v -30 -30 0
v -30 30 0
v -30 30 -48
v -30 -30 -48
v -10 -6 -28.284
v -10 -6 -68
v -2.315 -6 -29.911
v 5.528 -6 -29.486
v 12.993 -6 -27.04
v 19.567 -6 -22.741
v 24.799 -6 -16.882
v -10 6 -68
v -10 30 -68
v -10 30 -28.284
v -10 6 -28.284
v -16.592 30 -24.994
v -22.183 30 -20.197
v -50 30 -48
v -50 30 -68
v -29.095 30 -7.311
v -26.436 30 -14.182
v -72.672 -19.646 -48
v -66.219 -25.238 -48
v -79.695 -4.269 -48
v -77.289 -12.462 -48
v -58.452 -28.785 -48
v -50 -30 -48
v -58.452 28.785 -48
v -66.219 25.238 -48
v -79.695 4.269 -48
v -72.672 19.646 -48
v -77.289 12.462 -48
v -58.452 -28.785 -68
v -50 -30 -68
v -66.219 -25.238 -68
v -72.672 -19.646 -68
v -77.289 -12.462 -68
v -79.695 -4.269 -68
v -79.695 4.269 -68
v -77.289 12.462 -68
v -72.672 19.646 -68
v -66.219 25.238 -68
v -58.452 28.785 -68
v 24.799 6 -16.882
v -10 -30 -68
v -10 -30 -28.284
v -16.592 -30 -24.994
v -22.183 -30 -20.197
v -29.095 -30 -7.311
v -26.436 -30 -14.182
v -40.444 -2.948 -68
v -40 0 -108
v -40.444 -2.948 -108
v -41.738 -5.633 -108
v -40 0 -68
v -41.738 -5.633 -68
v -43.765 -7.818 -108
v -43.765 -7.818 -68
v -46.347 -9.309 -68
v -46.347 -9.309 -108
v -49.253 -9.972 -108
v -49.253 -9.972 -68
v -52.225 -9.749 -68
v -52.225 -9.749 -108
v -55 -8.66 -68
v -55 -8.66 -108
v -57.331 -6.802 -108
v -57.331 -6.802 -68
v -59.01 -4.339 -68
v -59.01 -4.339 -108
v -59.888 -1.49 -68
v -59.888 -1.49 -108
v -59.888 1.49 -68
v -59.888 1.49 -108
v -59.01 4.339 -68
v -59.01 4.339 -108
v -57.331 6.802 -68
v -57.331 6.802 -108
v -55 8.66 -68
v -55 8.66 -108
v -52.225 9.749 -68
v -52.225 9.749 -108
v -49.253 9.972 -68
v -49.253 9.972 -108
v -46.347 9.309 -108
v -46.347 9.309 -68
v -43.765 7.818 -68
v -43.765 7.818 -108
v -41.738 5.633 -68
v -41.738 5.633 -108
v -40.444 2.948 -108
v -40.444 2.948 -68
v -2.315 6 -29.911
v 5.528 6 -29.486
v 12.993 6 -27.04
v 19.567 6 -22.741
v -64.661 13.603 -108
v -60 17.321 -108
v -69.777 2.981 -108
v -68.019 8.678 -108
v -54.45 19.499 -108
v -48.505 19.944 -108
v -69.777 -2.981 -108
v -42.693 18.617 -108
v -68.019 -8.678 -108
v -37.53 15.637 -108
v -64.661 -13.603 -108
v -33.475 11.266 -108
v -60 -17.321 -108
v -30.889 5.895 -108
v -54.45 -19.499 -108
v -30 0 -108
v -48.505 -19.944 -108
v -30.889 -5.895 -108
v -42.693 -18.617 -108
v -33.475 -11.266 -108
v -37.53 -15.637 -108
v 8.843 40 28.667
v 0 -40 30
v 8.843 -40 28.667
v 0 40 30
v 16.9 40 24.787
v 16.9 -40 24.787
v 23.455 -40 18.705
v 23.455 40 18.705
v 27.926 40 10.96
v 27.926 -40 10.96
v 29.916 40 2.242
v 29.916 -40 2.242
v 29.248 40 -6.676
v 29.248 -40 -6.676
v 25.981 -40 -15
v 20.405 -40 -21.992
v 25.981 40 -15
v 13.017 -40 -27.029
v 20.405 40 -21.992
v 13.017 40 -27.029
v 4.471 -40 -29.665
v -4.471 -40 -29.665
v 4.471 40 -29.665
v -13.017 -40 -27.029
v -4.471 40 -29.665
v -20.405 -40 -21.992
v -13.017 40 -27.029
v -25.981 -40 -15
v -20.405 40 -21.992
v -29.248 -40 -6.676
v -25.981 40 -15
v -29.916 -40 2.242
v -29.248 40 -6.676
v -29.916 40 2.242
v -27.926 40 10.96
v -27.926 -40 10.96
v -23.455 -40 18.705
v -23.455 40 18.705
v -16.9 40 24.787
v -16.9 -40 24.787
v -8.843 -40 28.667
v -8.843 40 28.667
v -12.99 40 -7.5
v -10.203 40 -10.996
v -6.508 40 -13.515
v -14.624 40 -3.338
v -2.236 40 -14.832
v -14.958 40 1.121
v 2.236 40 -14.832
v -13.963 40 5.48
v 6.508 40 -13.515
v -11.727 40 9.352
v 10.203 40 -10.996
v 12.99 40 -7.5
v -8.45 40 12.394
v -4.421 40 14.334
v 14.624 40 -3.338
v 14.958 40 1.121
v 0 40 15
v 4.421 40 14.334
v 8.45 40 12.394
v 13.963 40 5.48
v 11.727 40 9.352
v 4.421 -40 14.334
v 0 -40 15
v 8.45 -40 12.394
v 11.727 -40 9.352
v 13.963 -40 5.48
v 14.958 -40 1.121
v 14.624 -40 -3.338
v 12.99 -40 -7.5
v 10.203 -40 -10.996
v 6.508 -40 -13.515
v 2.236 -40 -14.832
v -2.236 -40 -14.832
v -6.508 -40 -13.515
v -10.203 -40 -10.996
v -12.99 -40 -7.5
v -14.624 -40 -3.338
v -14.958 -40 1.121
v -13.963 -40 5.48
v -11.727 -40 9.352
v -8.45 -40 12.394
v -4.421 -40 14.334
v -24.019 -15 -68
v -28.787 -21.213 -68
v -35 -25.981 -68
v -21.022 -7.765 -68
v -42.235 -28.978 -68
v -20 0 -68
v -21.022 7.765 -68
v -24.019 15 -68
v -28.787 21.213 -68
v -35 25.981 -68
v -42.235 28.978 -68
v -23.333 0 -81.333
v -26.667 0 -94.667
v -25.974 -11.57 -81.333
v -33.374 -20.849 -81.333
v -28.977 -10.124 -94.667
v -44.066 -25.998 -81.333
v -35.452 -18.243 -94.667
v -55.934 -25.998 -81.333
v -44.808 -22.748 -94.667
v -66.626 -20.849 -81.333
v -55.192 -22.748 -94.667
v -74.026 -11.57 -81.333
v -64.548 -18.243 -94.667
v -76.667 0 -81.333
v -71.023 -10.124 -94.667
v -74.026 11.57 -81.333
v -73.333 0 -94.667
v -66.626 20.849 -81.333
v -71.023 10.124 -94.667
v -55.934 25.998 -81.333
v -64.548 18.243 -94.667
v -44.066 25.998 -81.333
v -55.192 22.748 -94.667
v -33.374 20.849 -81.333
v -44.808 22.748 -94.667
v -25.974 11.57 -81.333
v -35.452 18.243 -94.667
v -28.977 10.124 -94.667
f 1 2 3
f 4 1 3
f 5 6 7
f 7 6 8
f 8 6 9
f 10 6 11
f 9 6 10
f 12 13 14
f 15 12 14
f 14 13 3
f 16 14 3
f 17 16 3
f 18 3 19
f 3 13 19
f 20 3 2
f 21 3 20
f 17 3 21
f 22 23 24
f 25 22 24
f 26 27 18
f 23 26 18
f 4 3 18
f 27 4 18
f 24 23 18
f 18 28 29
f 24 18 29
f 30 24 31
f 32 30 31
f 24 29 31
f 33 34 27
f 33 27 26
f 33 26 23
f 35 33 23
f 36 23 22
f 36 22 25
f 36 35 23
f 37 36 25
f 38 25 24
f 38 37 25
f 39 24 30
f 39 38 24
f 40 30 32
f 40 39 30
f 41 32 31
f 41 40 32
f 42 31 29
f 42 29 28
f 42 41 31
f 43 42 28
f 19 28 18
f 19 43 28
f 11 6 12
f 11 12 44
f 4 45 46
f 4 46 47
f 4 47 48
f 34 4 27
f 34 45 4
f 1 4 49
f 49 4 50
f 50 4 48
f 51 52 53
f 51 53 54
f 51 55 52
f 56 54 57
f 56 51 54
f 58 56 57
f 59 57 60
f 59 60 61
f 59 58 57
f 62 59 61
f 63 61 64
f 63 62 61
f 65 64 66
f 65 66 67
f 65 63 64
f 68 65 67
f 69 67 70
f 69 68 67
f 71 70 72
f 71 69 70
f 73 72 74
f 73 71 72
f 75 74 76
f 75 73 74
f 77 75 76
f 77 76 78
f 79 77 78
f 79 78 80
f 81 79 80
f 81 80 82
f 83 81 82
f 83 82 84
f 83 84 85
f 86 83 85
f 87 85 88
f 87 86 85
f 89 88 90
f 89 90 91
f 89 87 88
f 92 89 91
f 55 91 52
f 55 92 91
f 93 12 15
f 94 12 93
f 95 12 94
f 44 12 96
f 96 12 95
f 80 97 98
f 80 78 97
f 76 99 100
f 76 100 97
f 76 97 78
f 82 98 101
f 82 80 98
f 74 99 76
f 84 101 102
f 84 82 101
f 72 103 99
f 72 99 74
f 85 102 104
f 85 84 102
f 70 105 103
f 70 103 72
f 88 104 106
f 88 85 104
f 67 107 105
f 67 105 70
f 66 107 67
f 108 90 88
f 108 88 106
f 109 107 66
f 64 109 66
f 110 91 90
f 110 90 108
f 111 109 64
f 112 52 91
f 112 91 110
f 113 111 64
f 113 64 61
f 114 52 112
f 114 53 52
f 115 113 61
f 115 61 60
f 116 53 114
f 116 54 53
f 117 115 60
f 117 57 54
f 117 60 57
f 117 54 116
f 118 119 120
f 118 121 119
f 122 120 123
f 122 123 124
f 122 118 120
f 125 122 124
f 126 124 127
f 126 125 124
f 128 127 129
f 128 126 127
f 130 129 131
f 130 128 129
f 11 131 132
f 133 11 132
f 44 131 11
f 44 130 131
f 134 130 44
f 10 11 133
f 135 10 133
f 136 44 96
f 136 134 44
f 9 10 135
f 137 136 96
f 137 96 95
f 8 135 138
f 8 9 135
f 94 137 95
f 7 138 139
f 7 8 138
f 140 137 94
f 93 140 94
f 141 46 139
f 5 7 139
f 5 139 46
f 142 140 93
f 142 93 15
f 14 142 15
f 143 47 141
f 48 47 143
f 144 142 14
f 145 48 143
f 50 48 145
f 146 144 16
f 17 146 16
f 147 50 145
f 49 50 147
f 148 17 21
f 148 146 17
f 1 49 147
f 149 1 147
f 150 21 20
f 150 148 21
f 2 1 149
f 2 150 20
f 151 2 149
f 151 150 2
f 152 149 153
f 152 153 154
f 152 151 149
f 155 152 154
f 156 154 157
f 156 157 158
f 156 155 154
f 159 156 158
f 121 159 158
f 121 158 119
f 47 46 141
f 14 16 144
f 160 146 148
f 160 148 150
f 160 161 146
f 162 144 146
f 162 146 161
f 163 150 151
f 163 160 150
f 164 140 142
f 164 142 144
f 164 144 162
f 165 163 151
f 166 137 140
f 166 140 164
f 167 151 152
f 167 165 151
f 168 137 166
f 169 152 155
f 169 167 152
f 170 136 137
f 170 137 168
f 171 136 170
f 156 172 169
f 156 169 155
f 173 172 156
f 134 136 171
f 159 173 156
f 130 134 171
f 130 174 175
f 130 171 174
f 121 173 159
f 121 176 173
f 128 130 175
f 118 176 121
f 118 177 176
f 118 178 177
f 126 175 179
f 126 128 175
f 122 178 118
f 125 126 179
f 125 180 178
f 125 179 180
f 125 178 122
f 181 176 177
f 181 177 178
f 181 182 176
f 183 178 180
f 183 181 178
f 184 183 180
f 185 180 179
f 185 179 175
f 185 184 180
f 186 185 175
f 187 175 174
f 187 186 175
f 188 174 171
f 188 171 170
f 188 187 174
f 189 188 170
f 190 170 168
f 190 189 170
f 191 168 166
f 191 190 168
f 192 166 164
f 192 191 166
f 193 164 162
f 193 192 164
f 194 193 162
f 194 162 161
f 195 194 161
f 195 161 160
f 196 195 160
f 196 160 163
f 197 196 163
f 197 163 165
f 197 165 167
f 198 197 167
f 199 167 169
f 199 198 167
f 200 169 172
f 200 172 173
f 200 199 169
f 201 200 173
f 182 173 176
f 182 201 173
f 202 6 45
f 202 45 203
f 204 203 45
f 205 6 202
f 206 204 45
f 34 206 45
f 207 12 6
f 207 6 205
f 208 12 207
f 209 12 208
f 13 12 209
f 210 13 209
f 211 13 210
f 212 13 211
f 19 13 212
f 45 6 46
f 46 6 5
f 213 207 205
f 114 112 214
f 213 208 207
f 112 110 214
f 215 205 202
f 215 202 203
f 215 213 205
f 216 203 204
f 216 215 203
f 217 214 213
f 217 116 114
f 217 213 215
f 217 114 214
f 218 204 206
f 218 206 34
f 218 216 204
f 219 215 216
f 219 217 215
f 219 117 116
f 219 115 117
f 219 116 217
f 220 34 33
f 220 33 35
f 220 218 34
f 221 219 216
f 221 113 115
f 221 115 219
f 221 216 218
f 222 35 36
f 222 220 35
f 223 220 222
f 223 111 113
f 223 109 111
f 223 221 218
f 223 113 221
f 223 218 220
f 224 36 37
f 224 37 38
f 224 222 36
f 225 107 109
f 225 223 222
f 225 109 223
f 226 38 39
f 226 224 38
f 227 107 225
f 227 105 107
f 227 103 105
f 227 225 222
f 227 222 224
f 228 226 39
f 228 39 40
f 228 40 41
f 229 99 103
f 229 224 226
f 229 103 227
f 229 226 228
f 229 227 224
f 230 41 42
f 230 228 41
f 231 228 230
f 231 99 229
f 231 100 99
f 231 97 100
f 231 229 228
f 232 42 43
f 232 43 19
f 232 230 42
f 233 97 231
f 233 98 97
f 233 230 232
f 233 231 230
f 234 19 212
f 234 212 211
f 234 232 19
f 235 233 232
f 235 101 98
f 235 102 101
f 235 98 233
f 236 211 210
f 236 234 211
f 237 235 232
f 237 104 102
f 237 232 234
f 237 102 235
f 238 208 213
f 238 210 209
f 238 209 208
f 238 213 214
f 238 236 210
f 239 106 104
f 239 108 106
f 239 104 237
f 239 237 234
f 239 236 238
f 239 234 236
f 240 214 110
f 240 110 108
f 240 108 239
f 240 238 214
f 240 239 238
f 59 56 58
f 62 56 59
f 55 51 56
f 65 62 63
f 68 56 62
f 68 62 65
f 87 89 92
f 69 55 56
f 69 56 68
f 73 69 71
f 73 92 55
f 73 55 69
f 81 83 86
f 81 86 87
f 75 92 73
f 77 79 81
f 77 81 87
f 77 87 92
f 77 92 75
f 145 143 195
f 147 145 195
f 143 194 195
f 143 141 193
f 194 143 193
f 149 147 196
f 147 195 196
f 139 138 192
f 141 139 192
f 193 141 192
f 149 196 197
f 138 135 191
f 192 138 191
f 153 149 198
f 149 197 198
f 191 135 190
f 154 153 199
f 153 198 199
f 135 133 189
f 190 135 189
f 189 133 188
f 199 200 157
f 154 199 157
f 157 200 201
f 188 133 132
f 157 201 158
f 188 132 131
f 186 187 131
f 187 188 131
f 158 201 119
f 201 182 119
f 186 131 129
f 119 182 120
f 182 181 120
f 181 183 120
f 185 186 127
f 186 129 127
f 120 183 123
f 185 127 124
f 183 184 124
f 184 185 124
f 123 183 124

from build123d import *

# Parameters (mm, degrees)
SKETCH1_R           = 30
SKETCH1_R_2         = 15
BOSS_EXTRUDE2_DEPTH = 40
BOSS_EXTRUDE8_DEPTH = 30
BOSS_EXTRUDE9_DEPTH = 20
RIB1_REACH          = 142.228
SKETCH10_WALL_W     = 344.295269622
SKETCH10_WALL_H     = 12


with BuildPart() as part:
    # Sketch1 → Boss-Extrude2 (new, symmetric)
    with BuildSketch(Plane(origin=(0, 0, 0), x_dir=(1, 0, 0), z_dir=(0, 1, 0))):
        with Locations(Location((0, 0, 0), (0, 0, 270))):
            Circle(SKETCH1_R)
        with Locations(Location((0, 0, 0), (0, 0, 270))):
            Circle(SKETCH1_R_2, mode=Mode.SUBTRACT)
    extrude(amount=BOSS_EXTRUDE2_DEPTH, both=True)

    # Sketch2 → Boss-Extrude8 (add, symmetric)
    with BuildSketch(Plane(origin=(0, 0, 0), x_dir=(1, 0, 0), z_dir=(0, 1, 0))):
        with BuildLine():
            Line((-30, 0), (-30, 48))
            Line((-30, 48), (-50, 48))
            Line((-50, 48), (-50, 68))
            Line((-50, 68), (-30, 68))
            Line((-30, 68), (-10, 68))
            Line((-10, 68), (-10, 28.284271247))
            ThreePointArc((-10, 28.284271247), (-24.494897428, 17.320508076), (-30, 0))
        make_face()
    extrude(amount=BOSS_EXTRUDE8_DEPTH, both=True)

    # Sketch7 → Boss-Extrude9 (add)
    with BuildSketch(Plane(origin=(0, 0, -68), x_dir=(-1, 0, 0), z_dir=(0, 0, -1))):
        with BuildLine():
            Line((50, 30), (50, -30))
            ThreePointArc((50, -30), (80, 0), (50, 30))
        make_face()
    extrude(amount=-BOSS_EXTRUDE9_DEPTH)

    # Sketch9 → Revolve2 (revolve)
    with BuildSketch(Plane(origin=(0, 0, 0), x_dir=(1, 0, 0), z_dir=(0, 1, 0)), mode=Mode.PRIVATE) as revolve2_sk:
        Polygon((-80, 68), (-70, 108), (-60, 108), (-60, 68), align=None)
    revolve(revolve2_sk.sketch.rotate(Axis((-50, 0, -68), (0, 0, -1)), 180), axis=Axis((-50, 0, -68), (0, 0, -1)))

    # Sketch10 wall → Rib1 (add, up to next)
    with BuildSketch(Plane(origin=(7.39950663, 0, -42.441103916), x_dir=(0.562740261082, 0, 0.826633775355), z_dir=(0.826633775355, 0, -0.562740261082)), mode=Mode.PRIVATE) as rib1_sk1:
        Rectangle(SKETCH10_WALL_W, SKETCH10_WALL_H)
    rib1_tool1 = extrude(rib1_sk1.sketch, amount=-RIB1_REACH, mode=Mode.PRIVATE) - part.part
    add(rib1_tool1.solids().sort_by_distance((7.39950663, 0, -42.441103916))[0])


solid = part.part
